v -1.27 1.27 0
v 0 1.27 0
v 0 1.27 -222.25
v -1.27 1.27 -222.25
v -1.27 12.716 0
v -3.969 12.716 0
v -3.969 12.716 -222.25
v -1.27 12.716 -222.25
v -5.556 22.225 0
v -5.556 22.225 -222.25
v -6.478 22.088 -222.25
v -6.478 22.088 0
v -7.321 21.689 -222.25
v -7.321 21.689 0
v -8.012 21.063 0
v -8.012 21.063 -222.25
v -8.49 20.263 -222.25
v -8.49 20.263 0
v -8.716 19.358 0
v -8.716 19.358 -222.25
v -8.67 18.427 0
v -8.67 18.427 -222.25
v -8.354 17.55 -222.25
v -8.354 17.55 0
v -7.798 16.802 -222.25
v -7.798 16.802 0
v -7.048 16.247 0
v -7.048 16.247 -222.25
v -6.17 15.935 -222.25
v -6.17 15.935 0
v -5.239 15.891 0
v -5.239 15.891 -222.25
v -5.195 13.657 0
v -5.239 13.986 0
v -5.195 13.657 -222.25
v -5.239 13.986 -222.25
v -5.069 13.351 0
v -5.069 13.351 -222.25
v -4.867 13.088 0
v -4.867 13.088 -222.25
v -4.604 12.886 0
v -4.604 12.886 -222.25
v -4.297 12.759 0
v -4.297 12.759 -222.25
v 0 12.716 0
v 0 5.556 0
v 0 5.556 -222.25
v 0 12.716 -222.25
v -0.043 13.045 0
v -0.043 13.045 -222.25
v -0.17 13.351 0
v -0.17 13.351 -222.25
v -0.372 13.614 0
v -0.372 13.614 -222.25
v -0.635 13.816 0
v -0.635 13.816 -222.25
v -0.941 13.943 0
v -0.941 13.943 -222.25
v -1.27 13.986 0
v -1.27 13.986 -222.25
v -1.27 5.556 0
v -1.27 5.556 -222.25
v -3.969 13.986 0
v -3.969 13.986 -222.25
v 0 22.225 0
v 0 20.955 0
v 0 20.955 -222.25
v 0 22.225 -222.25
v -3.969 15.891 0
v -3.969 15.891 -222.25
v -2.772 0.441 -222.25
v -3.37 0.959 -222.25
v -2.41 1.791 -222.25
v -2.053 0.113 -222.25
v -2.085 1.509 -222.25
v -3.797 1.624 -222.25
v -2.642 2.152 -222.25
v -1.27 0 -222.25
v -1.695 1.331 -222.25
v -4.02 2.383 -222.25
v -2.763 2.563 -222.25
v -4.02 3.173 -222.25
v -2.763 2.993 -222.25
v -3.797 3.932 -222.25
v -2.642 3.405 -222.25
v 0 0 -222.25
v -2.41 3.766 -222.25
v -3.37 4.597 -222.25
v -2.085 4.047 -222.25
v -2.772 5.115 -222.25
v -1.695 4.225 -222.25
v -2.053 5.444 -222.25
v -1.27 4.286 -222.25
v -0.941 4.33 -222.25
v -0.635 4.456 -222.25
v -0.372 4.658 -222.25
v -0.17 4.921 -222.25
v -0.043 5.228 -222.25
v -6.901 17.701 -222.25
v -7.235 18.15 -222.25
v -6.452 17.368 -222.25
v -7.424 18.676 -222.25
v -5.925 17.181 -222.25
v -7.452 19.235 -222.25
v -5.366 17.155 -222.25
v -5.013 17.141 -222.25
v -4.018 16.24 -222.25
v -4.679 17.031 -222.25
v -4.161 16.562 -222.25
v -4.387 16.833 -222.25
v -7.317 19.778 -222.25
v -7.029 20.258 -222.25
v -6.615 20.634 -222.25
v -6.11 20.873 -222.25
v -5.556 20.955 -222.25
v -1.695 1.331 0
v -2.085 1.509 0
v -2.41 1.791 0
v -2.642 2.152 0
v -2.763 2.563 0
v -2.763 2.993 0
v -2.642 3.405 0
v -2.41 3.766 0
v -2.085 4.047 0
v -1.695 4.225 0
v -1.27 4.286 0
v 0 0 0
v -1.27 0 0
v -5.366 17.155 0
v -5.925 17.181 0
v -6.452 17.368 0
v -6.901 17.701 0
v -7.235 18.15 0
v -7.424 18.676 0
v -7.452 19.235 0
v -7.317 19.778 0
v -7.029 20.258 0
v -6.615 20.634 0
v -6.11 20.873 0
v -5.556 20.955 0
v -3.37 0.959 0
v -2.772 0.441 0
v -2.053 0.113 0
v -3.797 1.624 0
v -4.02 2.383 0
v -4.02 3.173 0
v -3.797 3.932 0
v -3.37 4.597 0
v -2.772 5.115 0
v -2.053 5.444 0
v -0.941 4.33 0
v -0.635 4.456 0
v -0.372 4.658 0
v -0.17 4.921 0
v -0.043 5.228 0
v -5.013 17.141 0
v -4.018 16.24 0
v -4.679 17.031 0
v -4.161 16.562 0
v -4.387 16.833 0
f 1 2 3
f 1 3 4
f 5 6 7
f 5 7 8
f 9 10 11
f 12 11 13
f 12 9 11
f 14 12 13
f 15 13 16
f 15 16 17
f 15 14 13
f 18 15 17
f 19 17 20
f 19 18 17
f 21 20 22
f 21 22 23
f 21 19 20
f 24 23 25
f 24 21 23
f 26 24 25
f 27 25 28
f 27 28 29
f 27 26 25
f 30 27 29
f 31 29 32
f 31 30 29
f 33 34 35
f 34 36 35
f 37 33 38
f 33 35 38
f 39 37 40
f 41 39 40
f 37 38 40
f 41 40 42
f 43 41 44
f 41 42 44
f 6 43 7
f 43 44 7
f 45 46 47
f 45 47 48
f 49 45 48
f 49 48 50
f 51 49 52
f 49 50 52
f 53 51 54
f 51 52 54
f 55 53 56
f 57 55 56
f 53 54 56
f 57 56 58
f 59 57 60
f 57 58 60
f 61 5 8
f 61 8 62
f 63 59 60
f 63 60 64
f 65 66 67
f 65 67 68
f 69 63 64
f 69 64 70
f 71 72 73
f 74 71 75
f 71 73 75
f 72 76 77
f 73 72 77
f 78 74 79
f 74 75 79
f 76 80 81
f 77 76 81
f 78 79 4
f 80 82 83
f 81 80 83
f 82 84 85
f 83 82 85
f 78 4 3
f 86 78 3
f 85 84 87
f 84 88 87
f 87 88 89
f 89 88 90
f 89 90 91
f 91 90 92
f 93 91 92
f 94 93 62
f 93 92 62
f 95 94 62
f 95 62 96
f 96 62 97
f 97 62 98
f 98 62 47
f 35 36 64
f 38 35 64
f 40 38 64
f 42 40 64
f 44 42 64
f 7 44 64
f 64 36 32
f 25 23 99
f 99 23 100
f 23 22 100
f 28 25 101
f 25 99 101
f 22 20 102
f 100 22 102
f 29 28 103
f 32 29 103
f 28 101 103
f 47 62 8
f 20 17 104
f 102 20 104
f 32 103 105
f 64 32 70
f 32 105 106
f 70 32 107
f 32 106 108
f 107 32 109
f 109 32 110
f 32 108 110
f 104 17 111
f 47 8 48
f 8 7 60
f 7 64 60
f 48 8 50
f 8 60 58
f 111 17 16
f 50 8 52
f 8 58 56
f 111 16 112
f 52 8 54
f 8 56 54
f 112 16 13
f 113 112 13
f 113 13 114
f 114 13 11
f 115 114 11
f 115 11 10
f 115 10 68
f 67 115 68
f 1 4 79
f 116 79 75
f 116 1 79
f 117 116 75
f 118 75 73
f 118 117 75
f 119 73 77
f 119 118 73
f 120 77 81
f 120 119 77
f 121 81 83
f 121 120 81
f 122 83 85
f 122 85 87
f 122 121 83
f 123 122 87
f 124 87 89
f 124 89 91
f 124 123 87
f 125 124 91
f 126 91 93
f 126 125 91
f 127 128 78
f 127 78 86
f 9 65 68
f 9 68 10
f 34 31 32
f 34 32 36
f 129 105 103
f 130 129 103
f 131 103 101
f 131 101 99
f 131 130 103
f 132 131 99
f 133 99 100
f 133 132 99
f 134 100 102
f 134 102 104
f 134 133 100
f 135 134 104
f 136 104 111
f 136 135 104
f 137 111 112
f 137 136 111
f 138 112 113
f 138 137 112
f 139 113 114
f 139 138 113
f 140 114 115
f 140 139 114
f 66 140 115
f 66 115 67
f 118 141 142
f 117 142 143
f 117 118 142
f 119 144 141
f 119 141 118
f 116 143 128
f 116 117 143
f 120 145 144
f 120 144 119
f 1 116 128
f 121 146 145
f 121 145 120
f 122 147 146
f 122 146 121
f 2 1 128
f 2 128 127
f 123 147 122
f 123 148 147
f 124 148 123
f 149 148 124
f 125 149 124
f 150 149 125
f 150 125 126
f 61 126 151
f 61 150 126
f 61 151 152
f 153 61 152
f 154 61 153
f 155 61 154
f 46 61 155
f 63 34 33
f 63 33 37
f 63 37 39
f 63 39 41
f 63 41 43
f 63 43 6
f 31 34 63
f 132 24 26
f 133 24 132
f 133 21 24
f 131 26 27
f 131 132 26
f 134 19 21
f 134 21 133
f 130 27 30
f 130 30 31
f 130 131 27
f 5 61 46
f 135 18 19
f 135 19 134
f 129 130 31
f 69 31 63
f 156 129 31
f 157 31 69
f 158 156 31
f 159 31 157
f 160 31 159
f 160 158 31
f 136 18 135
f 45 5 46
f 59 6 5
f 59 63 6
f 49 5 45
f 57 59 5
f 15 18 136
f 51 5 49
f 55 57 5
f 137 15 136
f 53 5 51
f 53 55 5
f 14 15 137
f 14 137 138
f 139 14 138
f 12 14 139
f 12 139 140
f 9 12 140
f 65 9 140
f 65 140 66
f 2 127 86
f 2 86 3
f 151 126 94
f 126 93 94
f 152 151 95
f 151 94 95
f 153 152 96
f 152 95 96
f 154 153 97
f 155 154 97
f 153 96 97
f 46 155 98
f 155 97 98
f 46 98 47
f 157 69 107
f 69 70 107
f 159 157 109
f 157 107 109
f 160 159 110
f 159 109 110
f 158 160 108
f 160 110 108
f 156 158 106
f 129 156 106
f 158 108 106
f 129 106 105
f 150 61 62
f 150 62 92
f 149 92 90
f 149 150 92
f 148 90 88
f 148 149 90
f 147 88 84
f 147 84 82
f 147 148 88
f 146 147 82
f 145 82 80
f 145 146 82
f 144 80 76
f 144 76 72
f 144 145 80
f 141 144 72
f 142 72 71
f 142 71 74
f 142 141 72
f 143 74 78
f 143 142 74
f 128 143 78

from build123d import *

# Parameters (mm, degrees)
EXTRUDE_THIN2_DEPTH = 222.25
FILLET1_R           = 1.27


with BuildPart() as part:
    # Sketch1 → Extrude-Thin2 (new body)
    with BuildSketch(Plane.XY):
        with BuildLine():
            Line((0, 22.225), (-5.55625, 22.225))
            ThreePointArc((-5.55625, 22.225), (-8.727268782, 18.891050689), (-5.23875, 15.890914887))
            Line((-5.23875, 15.890914887), (-5.23875, 12.715914887))
            Line((-5.23875, 12.715914887), (-1.27, 12.715914887))
            Line((-1.27, 12.715914887), (-1.27, 5.55625))
            ThreePointArc((-1.27, 5.55625), (-4.048125, 2.778125), (-1.27, 0))
            Line((-1.27, 0), (0, 0))
            Line((0, 0), (0, 1.27))
            Line((0, 1.27), (-1.27, 1.27))
            ThreePointArc((-1.27, 1.27), (-2.593079188, 3.501936079), (0, 3.591476717))
            Line((0, 3.591476717), (0, 13.985914887))
            Line((0, 13.985914887), (-3.96875, 13.985914887))
            Line((-3.96875, 13.985914887), (-3.96875, 17.996971629))
            ThreePointArc((-3.96875, 17.996971629), (-7.234797593, 18.1491654), (-5.55625, 20.955))
            Line((-5.55625, 20.955), (0, 20.955))
            Line((0, 20.955), (0, 22.225))
        make_face()
    extrude(amount=-EXTRUDE_THIN2_DEPTH)

    # Fillet1
    fillet1_edges = [part.edges().sort_by_distance(p)[0] for p in [
        (-5.23875, 12.715914887, -111.125),
        (-3.96875, 17.996971629, -111.125),
        (0, 13.985914887, -111.125),
        (0, 3.591476717, -111.125),
    ]]
    fillet(fillet1_edges, radius=FILLET1_R)


solid = part.part
